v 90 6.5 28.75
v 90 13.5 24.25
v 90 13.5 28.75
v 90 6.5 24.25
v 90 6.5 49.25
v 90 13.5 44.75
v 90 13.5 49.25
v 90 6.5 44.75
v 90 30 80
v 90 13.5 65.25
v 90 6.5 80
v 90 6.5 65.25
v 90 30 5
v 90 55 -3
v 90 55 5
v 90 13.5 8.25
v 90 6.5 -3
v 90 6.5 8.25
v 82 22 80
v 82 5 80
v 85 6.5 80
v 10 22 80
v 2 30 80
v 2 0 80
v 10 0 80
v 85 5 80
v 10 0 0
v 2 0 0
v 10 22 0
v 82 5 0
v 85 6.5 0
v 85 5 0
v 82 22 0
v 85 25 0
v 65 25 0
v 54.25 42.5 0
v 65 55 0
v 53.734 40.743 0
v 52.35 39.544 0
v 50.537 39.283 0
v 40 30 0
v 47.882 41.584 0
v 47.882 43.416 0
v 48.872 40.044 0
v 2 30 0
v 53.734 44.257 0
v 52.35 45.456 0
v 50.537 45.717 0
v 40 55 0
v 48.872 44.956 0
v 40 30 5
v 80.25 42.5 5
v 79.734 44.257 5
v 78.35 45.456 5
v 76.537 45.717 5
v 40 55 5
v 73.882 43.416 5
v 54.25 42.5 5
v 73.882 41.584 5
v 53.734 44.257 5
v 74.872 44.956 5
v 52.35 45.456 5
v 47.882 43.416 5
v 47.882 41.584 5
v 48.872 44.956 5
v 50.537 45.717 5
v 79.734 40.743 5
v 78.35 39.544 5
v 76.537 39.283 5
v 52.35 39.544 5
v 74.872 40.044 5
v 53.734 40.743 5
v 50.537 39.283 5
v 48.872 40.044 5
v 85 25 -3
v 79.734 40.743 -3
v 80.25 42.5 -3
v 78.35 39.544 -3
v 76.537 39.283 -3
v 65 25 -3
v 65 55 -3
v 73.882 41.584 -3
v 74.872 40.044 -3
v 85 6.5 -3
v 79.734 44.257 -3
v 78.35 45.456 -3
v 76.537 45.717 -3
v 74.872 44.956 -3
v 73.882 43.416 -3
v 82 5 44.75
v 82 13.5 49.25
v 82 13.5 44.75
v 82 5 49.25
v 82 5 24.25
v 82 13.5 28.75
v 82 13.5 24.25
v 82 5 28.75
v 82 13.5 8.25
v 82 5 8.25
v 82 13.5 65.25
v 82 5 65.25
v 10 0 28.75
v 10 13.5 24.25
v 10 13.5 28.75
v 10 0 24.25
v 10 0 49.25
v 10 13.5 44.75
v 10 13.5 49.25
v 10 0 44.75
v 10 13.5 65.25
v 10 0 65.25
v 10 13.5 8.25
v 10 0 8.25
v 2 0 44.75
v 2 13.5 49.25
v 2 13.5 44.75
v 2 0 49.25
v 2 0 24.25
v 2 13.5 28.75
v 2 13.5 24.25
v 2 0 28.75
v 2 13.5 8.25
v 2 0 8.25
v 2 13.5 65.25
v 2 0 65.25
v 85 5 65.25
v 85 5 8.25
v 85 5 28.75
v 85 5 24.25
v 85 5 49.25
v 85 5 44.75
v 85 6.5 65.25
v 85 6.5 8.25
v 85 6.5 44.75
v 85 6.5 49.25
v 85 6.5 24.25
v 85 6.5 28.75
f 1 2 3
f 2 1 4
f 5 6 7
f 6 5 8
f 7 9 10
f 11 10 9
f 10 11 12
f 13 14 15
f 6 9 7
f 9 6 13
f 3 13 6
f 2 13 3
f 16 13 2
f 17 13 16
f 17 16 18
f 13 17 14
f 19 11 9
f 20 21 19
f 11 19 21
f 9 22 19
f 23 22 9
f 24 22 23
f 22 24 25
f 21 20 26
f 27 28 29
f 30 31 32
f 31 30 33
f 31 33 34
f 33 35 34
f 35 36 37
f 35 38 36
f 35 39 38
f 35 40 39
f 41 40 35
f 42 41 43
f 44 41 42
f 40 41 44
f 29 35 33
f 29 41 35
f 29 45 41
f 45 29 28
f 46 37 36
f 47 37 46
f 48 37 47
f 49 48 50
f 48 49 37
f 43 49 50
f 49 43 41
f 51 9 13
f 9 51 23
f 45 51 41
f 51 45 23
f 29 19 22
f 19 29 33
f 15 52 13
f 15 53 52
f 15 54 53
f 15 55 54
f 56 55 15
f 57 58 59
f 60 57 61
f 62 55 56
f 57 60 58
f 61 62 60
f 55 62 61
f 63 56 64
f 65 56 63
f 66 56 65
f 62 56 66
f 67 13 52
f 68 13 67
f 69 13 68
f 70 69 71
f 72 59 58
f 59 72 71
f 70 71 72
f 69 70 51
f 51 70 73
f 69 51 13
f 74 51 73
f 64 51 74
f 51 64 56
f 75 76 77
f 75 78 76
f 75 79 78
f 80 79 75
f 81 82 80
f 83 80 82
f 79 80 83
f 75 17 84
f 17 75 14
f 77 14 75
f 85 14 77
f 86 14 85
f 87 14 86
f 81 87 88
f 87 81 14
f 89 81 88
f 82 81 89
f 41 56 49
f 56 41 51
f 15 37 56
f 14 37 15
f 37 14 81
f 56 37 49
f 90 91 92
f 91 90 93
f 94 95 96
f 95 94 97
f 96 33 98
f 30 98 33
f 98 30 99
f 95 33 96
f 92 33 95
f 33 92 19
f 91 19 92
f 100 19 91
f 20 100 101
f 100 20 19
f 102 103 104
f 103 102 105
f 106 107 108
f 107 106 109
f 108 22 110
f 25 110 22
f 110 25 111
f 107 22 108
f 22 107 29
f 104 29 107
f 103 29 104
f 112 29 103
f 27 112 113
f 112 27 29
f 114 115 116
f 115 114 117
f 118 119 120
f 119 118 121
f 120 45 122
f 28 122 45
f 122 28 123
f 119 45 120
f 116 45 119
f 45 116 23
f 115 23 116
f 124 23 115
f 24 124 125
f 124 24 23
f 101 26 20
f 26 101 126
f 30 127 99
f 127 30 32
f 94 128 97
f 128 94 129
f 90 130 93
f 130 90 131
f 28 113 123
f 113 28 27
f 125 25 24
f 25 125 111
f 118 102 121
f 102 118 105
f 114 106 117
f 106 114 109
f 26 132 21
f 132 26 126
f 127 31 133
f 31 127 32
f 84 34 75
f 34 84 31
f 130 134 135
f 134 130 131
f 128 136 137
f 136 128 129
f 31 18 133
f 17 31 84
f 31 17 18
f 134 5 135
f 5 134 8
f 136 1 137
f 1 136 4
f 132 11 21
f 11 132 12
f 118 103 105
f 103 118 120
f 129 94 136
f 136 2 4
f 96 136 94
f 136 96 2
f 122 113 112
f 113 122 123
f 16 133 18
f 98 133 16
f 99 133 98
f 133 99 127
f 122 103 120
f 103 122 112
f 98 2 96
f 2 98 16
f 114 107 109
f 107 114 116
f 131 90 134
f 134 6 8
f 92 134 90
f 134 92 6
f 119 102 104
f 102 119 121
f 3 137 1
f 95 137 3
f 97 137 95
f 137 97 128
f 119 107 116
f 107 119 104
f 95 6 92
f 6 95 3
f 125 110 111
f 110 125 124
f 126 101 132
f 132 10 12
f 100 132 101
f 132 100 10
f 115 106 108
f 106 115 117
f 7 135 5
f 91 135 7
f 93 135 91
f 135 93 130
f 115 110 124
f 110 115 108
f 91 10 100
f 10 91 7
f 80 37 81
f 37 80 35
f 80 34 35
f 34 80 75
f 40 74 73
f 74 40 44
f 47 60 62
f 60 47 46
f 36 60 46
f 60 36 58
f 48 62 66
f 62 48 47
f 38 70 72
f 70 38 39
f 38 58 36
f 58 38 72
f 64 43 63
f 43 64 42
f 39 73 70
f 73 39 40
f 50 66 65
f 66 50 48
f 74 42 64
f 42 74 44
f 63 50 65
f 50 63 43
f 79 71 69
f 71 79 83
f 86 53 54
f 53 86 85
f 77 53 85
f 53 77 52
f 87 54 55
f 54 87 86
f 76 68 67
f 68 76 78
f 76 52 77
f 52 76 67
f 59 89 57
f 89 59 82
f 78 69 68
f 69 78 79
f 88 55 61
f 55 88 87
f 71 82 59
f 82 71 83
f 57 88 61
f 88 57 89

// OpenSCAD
//
//if (accessories=="ON"){
//	color([222/255,184/255,135/255]) translate([-50,33.5,-3]) board();
//	translate([-10,15,0]) Arduino(0,0,0);
//} 
//if (mode=="EXPLODED"){
//	baseWCuts();
//	translate([-45,-80,30]) backDoor();
//	translate([0,30,30]) frontPanel();
//	translate([0,30,30]) mirror([1,0,0]) frontPanel();
//}
//if (mode=="ASSEMBLED"){
//	baseWCuts();
//	translate([-45,-50,0]) backDoor();
//	frontPanel();
//	mirror([1,0,0]) frontPanel();
//}
//if (mode=="PARTS"){
//	baseWCuts();
//	translate([280,-10,40]) rotate([270,0,0]) frontPanel();
//	translate([-250,0,10]) rotate([270,0,0]) backDoor();
//	translate([230,-10,40]) mirror([1,0,0]) rotate([270,0,0]) frontPanel();
//
//}

translate([135,-30,0]) frontPanel();

//
///////////////////////////////
/* MAIN CONSTRUCTOR MODULES */
//////////////////////////////


//Creates exact front panel with cuts using frontPanelBasic()
module frontPanel(){ 
	difference(){
		translate([-126.5,52,0]) frontPanelBasic();
		baseWCuts();
		translate([-50,33.5,-3]) board();
		translate([65,10,95]) rotate([90,0,0]) cylinder(r=6.5,h=20);
		translate([-58,72.5,-10]) cylinder(r=3.25,h=20);//cuts panel screw holes
		translate([-84,72.5,-10]) cylinder(r=3.25,h=20);
	}
}

//Creates basic block front panel without cuts
module frontPanelBasic(){ 
	union(){
		cube([81.5,8,80]);
		translate([31.5,0,-3]) cube([50,33,8]);
		translate([73.5,-20,-5]) cube([8,20,85]);
		translate([-6.5,-23,0]) cube([8,31,80]);
	}
}

//Creates full base with sides, floor, and all necessary cuts
module baseWCuts(){
	difference(){
		base();
		translate([-50,33.5,-3]) board(); //cuts board
		translate([-10,15,0]) Arduino(0,0,0); //cuts arduino
		translate([-45,-50,0]) backDoor(); //cuts back door
		translate([-70,55,-3]) cube([140,30,3]); //cuts indent in prongs
		translate([-62.5,10,95]) rotate([90,0,0]) cylinder(r=3.25,h=20); //cuts hanger
		translate([62.5,10,95]) rotate([90,0,0]) cylinder(r=3.25,h=20);
		translate([-58,72.5,-10]) cylinder(r=3.25,h=20);//cuts panel screw holes
		translate([-84,72.5,-10]) cylinder(r=3.25,h=20);
		translate([58,72.5,-10]) cylinder(r=3.25,h=20);
		translate([84,72.5,-10]) cylinder(r=3.25,h=20);
		translate([-53,-5,2]) cube([15,15,15]); //cuts arduino extension port
		translate([-50,36.5,-3]) cube([100,20,3]);
	}
}

//Creates simple base with floor and sides
module base(){
	union(){
		translate([-53,-50,-8]) floor();
		translate([-53,-50,0]) sides();
		translate([-80,-4,80]) cube([35,12,25]); //creates top hinges 
		translate([45,-4,80]) cube([35,12,25]);
	}
}

//Creates back door that will fit into slots in the base.
module backDoor(){
	union(){
		cube([90,8,80]);
	
		translate([19.75,1.5,-5]) cube([5,5,5]); //bottom notches
		translate([44.5,1.5,-5]) cube([5,5,5]);
		translate([69.25,1.5,-5]) cube([5,5,5]);
	
		translate([-5,3,75]) cube([5,5,5]);//top notches
		translate([90,3,75]) cube([5,5,5]);
	
		translate([23,0,40]) rotate([90,0,0]) scale([1,1,1.5]) drawtext("metaLab."); //text
	}
}

//Creates walls including slants
module sides(){

	cube([8,85,80]);
	translate([98,0,0]) cube([8,85,80]);
	translate([-80,70,0]) slant();
	translate([186,70,0]) mirror([1,0,0]) slant();

}

//creates slanted L shaped wall
module slant(){
	polyhedron(
	points = [ [0,0,0],[80,0,0],[0,10,0],[8,10,0],[8,8,0], [80,8,0],
				[0,-20,80],[80,-20,80],[0,10,80],[8,10,80],[8,-12,80],
				[80,-12,80] ],

	faces = [ [0,1,5,4,3,2] ,[6,8,9,10,11,7], [2,8,6,0],
				[0,6,7,1], [1,7,11,5], [5,11,10,4], [4,10,9,3],
				[3,9,8,2]]


	);
}

//Creates floor of the enclosure
module floor(){
	union(){
		cube([106,86,8]);
		
		translate([-80,70,0]) cube([80,40,8]);//wings
		translate([106,70,0]) cube([80,40,8]);
	
		translate([-42,85,0]) cube([50,50,8]); //prongs
		translate([98,85,0]) cube([50,50,8]);
		diagonal();
		translate([106,0,0]) mirror([1,0,0]) diagonal();
	}
}

//Creates triangle inlet for floor
module diagonal(){
	polyhedron(
		points = [ [0,50,0],[0,70,0],[-20,70,0],[0,50,8],[0,70,8],[-20,70,8]],
		faces = [ [2,1,0],[3,4,5],[2,0,3,5],[0,1,4,3],[1,2,5,4] ]
	);
}

//Models enclosed circuit board
module board(){
	union(){
		cube([100,3,85]);
		translate([-87.5,-6,11.25]) cube([95,16,16]);//left
		translate([-87.5,-6,31.75]) cube([95,16,16]);
		translate([-87.5,-6,52.25]) cube([95,16,16]);
	
		translate([92.5,-6,11.25]) cube([95,16,16]);//right
		translate([92.5,-6,31.75]) cube([95,16,16]);
		translate([92.5,-6,52.25]) cube([95,16,16]);
	}
}

/////////////////////////
//TEXT DRAWING MODULES//
////////////////////////
//You can ignore these//

module drawtext(text) {
	//Characters
	chars = " !\"#$%&'()*+,-./0123456789:;<=>?@ABCDEFGHIJKLMNOPQRSTUVWXYZ[\\]^_`abcdefghijklmnopqrstuvwxyz{|}";

	//Chracter table defining 5x7 characters
	//Adapted from: http://www.geocities.com/dinceraydin/djlcdsim/chartable.js
	char_table = [ [ 0, 0, 0, 0, 0, 0, 0],
                  [ 4, 0, 4, 4, 4, 4, 4],
                  [ 0, 0, 0, 0,10,10,10],
                  [10,10,31,10,31,10,10],
                  [ 4,30, 5,14,20,15, 4],
                  [ 3,19, 8, 4, 2,25,24],
                  [13,18,21, 8,20,18,12],
                  [ 0, 0, 0, 0, 8, 4,12],
                  [ 2, 4, 8, 8, 8, 4, 2],
                  [ 8, 4, 2, 2, 2, 4, 8],
                  [ 0, 4,21,14,21, 4, 0],
                  [ 0, 4, 4,31, 4, 4, 0],
                  [ 8, 4,12, 0, 0, 0, 0],
                  [ 0, 0, 0,31, 0, 0, 0],
                  [12,12, 0, 0, 0, 0, 0],
                  [ 0,16, 8, 4, 2, 1, 0],
                  [14,17,25,21,19,17,14],
                  [14, 4, 4, 4, 4,12, 4],
                  [31, 8, 4, 2, 1,17,14],
                  [14,17, 1, 2, 4, 2,31],
                  [ 2, 2,31,18,10, 6, 2],
                  [14,17, 1, 1,30,16,31],
                  [14,17,17,30,16, 8, 6],
                  [ 8, 8, 8, 4, 2, 1,31],
                  [14,17,17,14,17,17,14],
                  [12, 2, 1,15,17,17,14],
                  [ 0,12,12, 0,12,12, 0],
                  [ 8, 4,12, 0,12,12, 0],
                  [ 2, 4, 8,16, 8, 4, 2],
                  [ 0, 0,31, 0,31, 0, 0],
                  [16, 8, 4, 2, 4, 8,16],
                  [ 4, 0, 4, 2, 1,17,14],
                  [14,21,21,13, 1,17,14],
                  [17,17,31,17,17,17,14],
                  [30,17,17,30,17,17,30],
                  [14,17,16,16,16,17,14],
                  [30,17,17,17,17,17,30],
                  [31,16,16,30,16,16,31],
                  [16,16,16,30,16,16,31],
                  [15,17,17,23,16,17,14],
                  [17,17,17,31,17,17,17],
                  [14, 4, 4, 4, 4, 4,14],
                  [12,18, 2, 2, 2, 2, 7],
                  [17,18,20,24,20,18,17],
                  [31,16,16,16,16,16,16],
                  [17,17,17,21,21,27,17],
                  [17,17,19,21,25,17,17],
                  [14,17,17,17,17,17,14],
                  [16,16,16,30,17,17,30],
                  [13,18,21,17,17,17,14],
                  [17,18,20,30,17,17,30],
                  [30, 1, 1,14,16,16,15],
                  [ 4, 4, 4, 4, 4, 4,31],
                  [14,17,17,17,17,17,17],
                  [ 4,10,17,17,17,17,17],
                  [10,21,21,21,17,17,17],
                  [17,17,10, 4,10,17,17],
                  [ 4, 4, 4,10,17,17,17],
                  [31,16, 8, 4, 2, 1,31],
                  [14, 8, 8, 8, 8, 8,14],
                  [ 0, 1, 2, 4, 8,16, 0],
                  [14, 2, 2, 2, 2, 2,14],
                  [ 0, 0, 0, 0,17,10, 4],
                  [31, 0, 0, 0, 0, 0, 0],
                  [ 0, 0, 0, 0, 2, 4, 8],
                  [15,17,15, 1,14, 0, 0],
                  [30,17,17,25,22,16,16],
                  [14,17,16,16,14, 0, 0],
                  [15,17,17,19,13, 1, 1],
                  [14,16,31,17,14, 0, 0],
                  [ 8, 8, 8,28, 8, 9, 6],
                  [14, 1,15,17,15, 0, 0],
                  [17,17,17,25,22,16,16],
                  [14, 4, 4, 4,12, 0, 4],
                  [12,18, 2, 2, 2, 6, 2],
                  [18,20,24,20,18,16,16],
                  [14, 4, 4, 4, 4, 4,12],
                  [17,17,21,21,26, 0, 0],
                  [17,17,17,25,22, 0, 0],
                  [14,17,17,17,14, 0, 0],
                  [16,16,30,17,30, 0, 0],
                  [ 1, 1,15,19,13, 0, 0],
                  [16,16,16,25,22, 0, 0],
                  [30, 1,14,16,15, 0, 0],
                  [ 6, 9, 8, 8,28, 8, 8],
                  [13,19,17,17,17, 0, 0],
                  [ 4,10,17,17,17, 0, 0],
                  [10,21,21,17,17, 0, 0],
                  [17,10, 4,10,17, 0, 0],
                  [14, 1,15,17,17, 0, 0],
                  [31, 8, 4, 2,31, 0, 0],
                  [ 2, 4, 4, 8, 4, 4, 2],
                  [ 4, 4, 4, 4, 4, 4, 4],
                  [ 8, 4, 4, 2, 4, 4, 8] ];

	//Binary decode table
	dec_table = [ "00000", "00001", "00010", "00011", "00100", "00101",
  	            "00110", "00111", "01000", "01001", "01010", "01011",
  	            "01100", "01101", "01110", "01111", "10000", "10001",
  	            "10010", "10011", "10100", "10101", "10110", "10111",
	            "11000", "11001", "11010", "11011", "11100", "11101",
	            "11110", "11111" ];

	//Process string one character at a time
	for(itext = [0:len(text)-1]) {
		//Convert character to index
		assign(ichar = search(text[itext],chars,1)[0]) {
			//Decode character - rows
			for(irow = [0:6]) {
				assign(val = dec_table[char_table[ichar][irow]]) {
					//Decode character - cols
					for(icol = [0:4]) {
						assign(bit = search(val[icol],"01",1)[0]) {
							if(bit) {
								//Output cube
								translate([icol + (6*itext), irow, 0])
									cube([1.0001,1.0001,1]);
							}
						}
					}
				}
			}
		}
	}
}


////////////////////////////
//ARDUINO DRAWING MODULES//
///////////////////////////
//You can ignore these//

board_height = 4;

module Arduino(solid_holes, combined_headers, extend_ports)
{
	echo(str("solid_holes: ", solid_holes));
	echo(str("combined_headers: ", combined_headers));
	echo(str("extend_ports: ", extend_ports));

	if (solid_holes == 1)
	{
		echo("solid holes");
		union()
		{
			Board();
			USB(extend_ports);
			PowerPlug(extend_ports);
			FemaleHeaders(combined_headers);
			MaleHeaders();
			ResetButton();
			ATMega();
			MountingHoles();
		}
	}
	else
	{
		echo("regular holes");
		difference()
		{
			union()
			{
				Board();
				USB(extend_ports);
				PowerPlug(extend_ports);
				FemaleHeaders(combined_headers);
				MaleHeaders();
				ResetButton();
				ATMega();
			}
			MountingHoles();
		}
	}
}

module ResetButton()
{
	translate([39, -26, board_height])
	{
		color([0.8, 0.8, 0.8])
		cube([6, 6, 2.2]);
		
		color([0.6, 0.4, 0.2])
		translate([3, 3, 0]) cylinder(r=1.4, h=3.5, $fn=25);
	}
}

module MaleHeaders()
{
	color([0.6, 0.6, 0.6])
	translate([0, 0, board_height])
	{
		translate([0, -7, 0]) cube([7, 5, 9.2]);
		translate([47.5, -26, 0]) cube([5, 7, 9.2]);
	}
}

module ATMega()
{
	color([0.3, 0.3, 0.3])
	translate([14, -39, board_height])
	{
		cube([35.5, 10, 7.5]);
	}
}

module FemaleHeaders(combined)
{
	color([0.3, 0.3, 0.3])
	translate([0, 0, board_height])
	{
		translate([0, -1, 0])
		{
			translate([7, 0, 0])
			{
				if(combined == 1)
				{
					cube([43, 2, 8.2]);
				}
				else
				{
					cube([21, 2, 8.2]);
					translate([22, 0, 0]) cube([21, 2, 8.2]);
				}
			}
		}

		translate([0, -50, 0])
		{
			translate([17, 0, 0])
			{
				if(combined == 1)
				{
					cube([33, 2, 8.2]);
				}
				else
				{
					cube([15.5, 2, 8.2]);
					translate([17.5, 0, 0]) cube([15.5, 2, 8.2]);
				}
			}
		}
	}
}

module PowerPlug(extended)
{
	if(extended == 1)
	{
		translate([-26.893, -47.4929962, board_height])
		color([0.3, 0.3, 0.3])
		cube([24, 9, 11]);
	}
	else
	{
		translate([-16.893, -47.4929962, board_height])
		color([0.3, 0.3, 0.3])
		cube([14, 9, 11]);
	}
}

module USB(extended)
{
	if(extended == 1)
	{
		translate([-31.465, -18.5623962, board_height])
		color([0.8, 0.8, 0.8])
		cube([26, 12, 11]);
	}
	else
	{
		translate([-61.465, -18.5623962, board_height])
		color([0.8, 0.8, 0.8])
		cube([56, 12, 11]);
	}
}


module Board()
{
	color([0, 0.6, 0.8])
	linear_extrude(height = board_height, convexity = 10, twist = 0)
	{
		polygon( points = [ [-15.115, 2.545],
						[49.4, 2.545],
						[50.925, 1.021],
						[50.925, -10.409],
						[53.465, -12.949],
						[53.465, -45.715],
						[50.925, -48.255],
						[50.925, -50.795],
						[-15.115, -50.795] ],
				paths = [[0, 1, 2, 3, 4, 5, 6, 7, 8]],
				convexity = 10);
	}
}

module MountingHoles()
{
	translate([0, 0, -10])
	{
		ArduinoHole(25);
		translate([-1.0929112, -48.4026972, 0]) ArduinoHole(25);
		translate([51, -15.25, 0]) ArduinoHole(25);
		translate([51, -43.25, 0]) ArduinoHole(25);
	}
}

module ArduinoHole(length)
{
	color([0.7, 0.7, 0.7])
	cylinder(r=1.5, h=length, $fn=25);
}
